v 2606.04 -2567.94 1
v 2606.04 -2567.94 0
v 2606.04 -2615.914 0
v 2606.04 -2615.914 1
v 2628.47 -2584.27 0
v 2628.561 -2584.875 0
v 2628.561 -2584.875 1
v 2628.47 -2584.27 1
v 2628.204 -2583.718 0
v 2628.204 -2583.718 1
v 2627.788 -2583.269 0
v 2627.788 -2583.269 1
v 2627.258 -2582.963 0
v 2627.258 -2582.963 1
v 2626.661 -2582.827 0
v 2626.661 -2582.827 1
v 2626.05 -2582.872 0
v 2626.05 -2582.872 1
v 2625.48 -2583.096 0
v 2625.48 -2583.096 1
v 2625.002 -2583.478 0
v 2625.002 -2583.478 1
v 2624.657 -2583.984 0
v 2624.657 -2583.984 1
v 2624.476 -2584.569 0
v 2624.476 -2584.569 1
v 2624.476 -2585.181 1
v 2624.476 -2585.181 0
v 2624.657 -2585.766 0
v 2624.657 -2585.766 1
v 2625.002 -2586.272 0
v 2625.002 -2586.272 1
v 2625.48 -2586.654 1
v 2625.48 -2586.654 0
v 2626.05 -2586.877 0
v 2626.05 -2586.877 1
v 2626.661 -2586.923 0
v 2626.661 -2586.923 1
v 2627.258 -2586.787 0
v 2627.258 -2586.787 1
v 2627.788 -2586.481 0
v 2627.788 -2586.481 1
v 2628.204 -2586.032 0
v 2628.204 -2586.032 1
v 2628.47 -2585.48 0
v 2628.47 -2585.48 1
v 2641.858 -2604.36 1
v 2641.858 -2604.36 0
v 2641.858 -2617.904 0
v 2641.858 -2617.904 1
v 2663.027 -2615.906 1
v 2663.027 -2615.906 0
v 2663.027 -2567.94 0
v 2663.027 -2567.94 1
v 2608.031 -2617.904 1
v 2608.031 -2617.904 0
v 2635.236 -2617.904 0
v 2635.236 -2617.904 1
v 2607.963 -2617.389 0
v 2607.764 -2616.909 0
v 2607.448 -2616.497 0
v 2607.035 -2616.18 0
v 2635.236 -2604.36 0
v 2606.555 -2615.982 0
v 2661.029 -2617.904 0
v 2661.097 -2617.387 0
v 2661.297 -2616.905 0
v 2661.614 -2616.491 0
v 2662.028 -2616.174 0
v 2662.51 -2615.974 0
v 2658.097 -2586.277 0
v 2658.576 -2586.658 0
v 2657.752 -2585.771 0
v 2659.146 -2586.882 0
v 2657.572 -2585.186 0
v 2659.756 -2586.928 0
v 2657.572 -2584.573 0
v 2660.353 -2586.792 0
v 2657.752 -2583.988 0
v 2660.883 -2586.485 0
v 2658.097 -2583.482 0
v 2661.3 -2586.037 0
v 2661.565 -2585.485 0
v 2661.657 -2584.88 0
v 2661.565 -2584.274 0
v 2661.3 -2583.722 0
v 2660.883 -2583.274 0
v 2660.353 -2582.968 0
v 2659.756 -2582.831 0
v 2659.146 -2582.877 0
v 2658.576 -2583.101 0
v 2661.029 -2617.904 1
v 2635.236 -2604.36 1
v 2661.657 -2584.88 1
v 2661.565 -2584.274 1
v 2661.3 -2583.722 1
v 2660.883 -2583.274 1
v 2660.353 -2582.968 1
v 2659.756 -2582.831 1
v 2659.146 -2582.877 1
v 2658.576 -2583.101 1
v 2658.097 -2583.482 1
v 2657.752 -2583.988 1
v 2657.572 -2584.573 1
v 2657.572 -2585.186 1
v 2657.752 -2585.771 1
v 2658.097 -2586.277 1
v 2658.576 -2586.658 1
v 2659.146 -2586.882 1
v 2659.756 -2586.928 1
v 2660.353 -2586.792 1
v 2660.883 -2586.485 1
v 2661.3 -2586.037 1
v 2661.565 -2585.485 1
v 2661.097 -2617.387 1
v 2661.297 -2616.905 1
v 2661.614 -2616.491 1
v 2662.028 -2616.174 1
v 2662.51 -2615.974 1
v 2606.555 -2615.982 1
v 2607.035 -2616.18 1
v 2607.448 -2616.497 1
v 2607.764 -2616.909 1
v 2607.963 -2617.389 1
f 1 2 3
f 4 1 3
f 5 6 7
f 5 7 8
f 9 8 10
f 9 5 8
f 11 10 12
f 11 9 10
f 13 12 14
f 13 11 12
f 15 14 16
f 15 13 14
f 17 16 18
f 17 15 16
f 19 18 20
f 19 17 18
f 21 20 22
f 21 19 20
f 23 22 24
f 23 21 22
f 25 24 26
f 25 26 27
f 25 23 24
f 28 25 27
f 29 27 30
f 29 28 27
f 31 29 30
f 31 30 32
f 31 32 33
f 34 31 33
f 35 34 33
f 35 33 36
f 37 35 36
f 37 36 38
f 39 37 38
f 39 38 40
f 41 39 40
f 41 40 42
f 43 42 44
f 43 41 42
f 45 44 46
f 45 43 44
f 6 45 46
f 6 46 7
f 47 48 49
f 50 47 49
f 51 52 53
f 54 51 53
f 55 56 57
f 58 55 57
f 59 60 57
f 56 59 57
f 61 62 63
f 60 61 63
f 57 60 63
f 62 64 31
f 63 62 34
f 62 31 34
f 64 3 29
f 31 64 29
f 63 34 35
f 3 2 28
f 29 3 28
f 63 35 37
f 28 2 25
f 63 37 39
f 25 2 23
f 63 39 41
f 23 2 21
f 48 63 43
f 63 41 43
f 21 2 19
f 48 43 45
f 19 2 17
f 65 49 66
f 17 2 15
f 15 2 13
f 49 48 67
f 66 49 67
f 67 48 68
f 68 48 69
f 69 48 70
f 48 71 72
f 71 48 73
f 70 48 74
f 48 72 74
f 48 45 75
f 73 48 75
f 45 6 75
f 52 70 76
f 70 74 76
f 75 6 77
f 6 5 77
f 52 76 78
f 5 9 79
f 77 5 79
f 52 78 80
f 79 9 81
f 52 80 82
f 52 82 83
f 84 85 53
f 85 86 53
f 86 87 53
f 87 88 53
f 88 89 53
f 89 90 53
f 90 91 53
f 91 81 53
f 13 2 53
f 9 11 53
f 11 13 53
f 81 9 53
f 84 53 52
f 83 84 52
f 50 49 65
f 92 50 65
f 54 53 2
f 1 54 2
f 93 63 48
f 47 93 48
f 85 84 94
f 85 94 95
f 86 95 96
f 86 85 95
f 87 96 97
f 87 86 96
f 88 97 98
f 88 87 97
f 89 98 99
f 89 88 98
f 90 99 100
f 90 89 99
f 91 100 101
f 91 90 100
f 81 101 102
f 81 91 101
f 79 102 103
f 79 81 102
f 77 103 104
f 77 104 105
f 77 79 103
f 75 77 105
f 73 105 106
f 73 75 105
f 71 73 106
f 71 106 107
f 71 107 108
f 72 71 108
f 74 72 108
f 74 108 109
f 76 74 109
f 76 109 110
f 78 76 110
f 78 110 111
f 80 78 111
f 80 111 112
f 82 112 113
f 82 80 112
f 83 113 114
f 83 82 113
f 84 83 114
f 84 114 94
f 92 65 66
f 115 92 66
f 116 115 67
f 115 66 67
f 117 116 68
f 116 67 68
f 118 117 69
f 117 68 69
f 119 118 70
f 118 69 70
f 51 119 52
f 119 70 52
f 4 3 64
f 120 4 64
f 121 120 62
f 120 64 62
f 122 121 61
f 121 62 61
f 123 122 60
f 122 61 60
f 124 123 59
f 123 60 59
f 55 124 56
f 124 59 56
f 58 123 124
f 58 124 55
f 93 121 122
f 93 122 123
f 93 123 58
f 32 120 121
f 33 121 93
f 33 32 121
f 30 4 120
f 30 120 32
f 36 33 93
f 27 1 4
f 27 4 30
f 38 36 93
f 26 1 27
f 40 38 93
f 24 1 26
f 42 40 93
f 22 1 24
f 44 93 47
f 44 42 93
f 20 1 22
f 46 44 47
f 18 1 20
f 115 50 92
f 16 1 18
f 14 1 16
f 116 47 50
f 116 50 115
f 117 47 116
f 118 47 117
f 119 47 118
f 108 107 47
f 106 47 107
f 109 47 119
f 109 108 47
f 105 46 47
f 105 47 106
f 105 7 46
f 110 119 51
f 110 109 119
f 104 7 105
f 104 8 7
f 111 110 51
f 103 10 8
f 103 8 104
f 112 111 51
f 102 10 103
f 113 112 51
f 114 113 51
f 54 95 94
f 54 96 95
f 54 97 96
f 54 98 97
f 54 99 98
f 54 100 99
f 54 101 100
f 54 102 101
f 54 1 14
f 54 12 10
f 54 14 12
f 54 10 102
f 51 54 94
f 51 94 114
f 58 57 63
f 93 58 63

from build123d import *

# Parameters (mm, degrees)
MODEL_R         = 2.054
EXTRUDE_1_DEPTH = 1


with BuildPart() as part:
    # Model → Бобышка-Вытянуть1 (new body)
    with BuildSketch(Plane.XY):
        with BuildLine():
            Line((2635.23603, -2604.35979), (2641.85781, -2604.35979))
            Line((2641.85781, -2604.35979), (2641.85781, -2617.90434))
            Line((2641.85781, -2617.90434), (2661.0288664, -2617.90434))
            ThreePointArc((2661.0288664, -2617.90434), (2661.614235055, -2616.491135055), (2663.02744, -2615.9057664))
            Line((2663.02744, -2615.9057664), (2663.02744, -2567.94))
            Line((2663.02744, -2567.94), (2606.04, -2567.94))
            Line((2606.04, -2567.94), (2606.04, -2615.9137928))
            ThreePointArc((2606.04, -2615.9137928), (2607.447529423, -2616.496810577), (2608.0305472, -2617.90434))
            Line((2608.0305472, -2617.90434), (2635.23603, -2617.90434))
            Line((2635.23603, -2617.90434), (2635.23603, -2604.35979))
        make_face()
        with Locations((2626.50732, -2584.8749456)):
            Circle(MODEL_R, mode=Mode.SUBTRACT)
        with Locations((2659.602587949, -2584.87952199)):
            Circle(MODEL_R, mode=Mode.SUBTRACT)
    extrude(amount=EXTRUDE_1_DEPTH)


solid = part.part
